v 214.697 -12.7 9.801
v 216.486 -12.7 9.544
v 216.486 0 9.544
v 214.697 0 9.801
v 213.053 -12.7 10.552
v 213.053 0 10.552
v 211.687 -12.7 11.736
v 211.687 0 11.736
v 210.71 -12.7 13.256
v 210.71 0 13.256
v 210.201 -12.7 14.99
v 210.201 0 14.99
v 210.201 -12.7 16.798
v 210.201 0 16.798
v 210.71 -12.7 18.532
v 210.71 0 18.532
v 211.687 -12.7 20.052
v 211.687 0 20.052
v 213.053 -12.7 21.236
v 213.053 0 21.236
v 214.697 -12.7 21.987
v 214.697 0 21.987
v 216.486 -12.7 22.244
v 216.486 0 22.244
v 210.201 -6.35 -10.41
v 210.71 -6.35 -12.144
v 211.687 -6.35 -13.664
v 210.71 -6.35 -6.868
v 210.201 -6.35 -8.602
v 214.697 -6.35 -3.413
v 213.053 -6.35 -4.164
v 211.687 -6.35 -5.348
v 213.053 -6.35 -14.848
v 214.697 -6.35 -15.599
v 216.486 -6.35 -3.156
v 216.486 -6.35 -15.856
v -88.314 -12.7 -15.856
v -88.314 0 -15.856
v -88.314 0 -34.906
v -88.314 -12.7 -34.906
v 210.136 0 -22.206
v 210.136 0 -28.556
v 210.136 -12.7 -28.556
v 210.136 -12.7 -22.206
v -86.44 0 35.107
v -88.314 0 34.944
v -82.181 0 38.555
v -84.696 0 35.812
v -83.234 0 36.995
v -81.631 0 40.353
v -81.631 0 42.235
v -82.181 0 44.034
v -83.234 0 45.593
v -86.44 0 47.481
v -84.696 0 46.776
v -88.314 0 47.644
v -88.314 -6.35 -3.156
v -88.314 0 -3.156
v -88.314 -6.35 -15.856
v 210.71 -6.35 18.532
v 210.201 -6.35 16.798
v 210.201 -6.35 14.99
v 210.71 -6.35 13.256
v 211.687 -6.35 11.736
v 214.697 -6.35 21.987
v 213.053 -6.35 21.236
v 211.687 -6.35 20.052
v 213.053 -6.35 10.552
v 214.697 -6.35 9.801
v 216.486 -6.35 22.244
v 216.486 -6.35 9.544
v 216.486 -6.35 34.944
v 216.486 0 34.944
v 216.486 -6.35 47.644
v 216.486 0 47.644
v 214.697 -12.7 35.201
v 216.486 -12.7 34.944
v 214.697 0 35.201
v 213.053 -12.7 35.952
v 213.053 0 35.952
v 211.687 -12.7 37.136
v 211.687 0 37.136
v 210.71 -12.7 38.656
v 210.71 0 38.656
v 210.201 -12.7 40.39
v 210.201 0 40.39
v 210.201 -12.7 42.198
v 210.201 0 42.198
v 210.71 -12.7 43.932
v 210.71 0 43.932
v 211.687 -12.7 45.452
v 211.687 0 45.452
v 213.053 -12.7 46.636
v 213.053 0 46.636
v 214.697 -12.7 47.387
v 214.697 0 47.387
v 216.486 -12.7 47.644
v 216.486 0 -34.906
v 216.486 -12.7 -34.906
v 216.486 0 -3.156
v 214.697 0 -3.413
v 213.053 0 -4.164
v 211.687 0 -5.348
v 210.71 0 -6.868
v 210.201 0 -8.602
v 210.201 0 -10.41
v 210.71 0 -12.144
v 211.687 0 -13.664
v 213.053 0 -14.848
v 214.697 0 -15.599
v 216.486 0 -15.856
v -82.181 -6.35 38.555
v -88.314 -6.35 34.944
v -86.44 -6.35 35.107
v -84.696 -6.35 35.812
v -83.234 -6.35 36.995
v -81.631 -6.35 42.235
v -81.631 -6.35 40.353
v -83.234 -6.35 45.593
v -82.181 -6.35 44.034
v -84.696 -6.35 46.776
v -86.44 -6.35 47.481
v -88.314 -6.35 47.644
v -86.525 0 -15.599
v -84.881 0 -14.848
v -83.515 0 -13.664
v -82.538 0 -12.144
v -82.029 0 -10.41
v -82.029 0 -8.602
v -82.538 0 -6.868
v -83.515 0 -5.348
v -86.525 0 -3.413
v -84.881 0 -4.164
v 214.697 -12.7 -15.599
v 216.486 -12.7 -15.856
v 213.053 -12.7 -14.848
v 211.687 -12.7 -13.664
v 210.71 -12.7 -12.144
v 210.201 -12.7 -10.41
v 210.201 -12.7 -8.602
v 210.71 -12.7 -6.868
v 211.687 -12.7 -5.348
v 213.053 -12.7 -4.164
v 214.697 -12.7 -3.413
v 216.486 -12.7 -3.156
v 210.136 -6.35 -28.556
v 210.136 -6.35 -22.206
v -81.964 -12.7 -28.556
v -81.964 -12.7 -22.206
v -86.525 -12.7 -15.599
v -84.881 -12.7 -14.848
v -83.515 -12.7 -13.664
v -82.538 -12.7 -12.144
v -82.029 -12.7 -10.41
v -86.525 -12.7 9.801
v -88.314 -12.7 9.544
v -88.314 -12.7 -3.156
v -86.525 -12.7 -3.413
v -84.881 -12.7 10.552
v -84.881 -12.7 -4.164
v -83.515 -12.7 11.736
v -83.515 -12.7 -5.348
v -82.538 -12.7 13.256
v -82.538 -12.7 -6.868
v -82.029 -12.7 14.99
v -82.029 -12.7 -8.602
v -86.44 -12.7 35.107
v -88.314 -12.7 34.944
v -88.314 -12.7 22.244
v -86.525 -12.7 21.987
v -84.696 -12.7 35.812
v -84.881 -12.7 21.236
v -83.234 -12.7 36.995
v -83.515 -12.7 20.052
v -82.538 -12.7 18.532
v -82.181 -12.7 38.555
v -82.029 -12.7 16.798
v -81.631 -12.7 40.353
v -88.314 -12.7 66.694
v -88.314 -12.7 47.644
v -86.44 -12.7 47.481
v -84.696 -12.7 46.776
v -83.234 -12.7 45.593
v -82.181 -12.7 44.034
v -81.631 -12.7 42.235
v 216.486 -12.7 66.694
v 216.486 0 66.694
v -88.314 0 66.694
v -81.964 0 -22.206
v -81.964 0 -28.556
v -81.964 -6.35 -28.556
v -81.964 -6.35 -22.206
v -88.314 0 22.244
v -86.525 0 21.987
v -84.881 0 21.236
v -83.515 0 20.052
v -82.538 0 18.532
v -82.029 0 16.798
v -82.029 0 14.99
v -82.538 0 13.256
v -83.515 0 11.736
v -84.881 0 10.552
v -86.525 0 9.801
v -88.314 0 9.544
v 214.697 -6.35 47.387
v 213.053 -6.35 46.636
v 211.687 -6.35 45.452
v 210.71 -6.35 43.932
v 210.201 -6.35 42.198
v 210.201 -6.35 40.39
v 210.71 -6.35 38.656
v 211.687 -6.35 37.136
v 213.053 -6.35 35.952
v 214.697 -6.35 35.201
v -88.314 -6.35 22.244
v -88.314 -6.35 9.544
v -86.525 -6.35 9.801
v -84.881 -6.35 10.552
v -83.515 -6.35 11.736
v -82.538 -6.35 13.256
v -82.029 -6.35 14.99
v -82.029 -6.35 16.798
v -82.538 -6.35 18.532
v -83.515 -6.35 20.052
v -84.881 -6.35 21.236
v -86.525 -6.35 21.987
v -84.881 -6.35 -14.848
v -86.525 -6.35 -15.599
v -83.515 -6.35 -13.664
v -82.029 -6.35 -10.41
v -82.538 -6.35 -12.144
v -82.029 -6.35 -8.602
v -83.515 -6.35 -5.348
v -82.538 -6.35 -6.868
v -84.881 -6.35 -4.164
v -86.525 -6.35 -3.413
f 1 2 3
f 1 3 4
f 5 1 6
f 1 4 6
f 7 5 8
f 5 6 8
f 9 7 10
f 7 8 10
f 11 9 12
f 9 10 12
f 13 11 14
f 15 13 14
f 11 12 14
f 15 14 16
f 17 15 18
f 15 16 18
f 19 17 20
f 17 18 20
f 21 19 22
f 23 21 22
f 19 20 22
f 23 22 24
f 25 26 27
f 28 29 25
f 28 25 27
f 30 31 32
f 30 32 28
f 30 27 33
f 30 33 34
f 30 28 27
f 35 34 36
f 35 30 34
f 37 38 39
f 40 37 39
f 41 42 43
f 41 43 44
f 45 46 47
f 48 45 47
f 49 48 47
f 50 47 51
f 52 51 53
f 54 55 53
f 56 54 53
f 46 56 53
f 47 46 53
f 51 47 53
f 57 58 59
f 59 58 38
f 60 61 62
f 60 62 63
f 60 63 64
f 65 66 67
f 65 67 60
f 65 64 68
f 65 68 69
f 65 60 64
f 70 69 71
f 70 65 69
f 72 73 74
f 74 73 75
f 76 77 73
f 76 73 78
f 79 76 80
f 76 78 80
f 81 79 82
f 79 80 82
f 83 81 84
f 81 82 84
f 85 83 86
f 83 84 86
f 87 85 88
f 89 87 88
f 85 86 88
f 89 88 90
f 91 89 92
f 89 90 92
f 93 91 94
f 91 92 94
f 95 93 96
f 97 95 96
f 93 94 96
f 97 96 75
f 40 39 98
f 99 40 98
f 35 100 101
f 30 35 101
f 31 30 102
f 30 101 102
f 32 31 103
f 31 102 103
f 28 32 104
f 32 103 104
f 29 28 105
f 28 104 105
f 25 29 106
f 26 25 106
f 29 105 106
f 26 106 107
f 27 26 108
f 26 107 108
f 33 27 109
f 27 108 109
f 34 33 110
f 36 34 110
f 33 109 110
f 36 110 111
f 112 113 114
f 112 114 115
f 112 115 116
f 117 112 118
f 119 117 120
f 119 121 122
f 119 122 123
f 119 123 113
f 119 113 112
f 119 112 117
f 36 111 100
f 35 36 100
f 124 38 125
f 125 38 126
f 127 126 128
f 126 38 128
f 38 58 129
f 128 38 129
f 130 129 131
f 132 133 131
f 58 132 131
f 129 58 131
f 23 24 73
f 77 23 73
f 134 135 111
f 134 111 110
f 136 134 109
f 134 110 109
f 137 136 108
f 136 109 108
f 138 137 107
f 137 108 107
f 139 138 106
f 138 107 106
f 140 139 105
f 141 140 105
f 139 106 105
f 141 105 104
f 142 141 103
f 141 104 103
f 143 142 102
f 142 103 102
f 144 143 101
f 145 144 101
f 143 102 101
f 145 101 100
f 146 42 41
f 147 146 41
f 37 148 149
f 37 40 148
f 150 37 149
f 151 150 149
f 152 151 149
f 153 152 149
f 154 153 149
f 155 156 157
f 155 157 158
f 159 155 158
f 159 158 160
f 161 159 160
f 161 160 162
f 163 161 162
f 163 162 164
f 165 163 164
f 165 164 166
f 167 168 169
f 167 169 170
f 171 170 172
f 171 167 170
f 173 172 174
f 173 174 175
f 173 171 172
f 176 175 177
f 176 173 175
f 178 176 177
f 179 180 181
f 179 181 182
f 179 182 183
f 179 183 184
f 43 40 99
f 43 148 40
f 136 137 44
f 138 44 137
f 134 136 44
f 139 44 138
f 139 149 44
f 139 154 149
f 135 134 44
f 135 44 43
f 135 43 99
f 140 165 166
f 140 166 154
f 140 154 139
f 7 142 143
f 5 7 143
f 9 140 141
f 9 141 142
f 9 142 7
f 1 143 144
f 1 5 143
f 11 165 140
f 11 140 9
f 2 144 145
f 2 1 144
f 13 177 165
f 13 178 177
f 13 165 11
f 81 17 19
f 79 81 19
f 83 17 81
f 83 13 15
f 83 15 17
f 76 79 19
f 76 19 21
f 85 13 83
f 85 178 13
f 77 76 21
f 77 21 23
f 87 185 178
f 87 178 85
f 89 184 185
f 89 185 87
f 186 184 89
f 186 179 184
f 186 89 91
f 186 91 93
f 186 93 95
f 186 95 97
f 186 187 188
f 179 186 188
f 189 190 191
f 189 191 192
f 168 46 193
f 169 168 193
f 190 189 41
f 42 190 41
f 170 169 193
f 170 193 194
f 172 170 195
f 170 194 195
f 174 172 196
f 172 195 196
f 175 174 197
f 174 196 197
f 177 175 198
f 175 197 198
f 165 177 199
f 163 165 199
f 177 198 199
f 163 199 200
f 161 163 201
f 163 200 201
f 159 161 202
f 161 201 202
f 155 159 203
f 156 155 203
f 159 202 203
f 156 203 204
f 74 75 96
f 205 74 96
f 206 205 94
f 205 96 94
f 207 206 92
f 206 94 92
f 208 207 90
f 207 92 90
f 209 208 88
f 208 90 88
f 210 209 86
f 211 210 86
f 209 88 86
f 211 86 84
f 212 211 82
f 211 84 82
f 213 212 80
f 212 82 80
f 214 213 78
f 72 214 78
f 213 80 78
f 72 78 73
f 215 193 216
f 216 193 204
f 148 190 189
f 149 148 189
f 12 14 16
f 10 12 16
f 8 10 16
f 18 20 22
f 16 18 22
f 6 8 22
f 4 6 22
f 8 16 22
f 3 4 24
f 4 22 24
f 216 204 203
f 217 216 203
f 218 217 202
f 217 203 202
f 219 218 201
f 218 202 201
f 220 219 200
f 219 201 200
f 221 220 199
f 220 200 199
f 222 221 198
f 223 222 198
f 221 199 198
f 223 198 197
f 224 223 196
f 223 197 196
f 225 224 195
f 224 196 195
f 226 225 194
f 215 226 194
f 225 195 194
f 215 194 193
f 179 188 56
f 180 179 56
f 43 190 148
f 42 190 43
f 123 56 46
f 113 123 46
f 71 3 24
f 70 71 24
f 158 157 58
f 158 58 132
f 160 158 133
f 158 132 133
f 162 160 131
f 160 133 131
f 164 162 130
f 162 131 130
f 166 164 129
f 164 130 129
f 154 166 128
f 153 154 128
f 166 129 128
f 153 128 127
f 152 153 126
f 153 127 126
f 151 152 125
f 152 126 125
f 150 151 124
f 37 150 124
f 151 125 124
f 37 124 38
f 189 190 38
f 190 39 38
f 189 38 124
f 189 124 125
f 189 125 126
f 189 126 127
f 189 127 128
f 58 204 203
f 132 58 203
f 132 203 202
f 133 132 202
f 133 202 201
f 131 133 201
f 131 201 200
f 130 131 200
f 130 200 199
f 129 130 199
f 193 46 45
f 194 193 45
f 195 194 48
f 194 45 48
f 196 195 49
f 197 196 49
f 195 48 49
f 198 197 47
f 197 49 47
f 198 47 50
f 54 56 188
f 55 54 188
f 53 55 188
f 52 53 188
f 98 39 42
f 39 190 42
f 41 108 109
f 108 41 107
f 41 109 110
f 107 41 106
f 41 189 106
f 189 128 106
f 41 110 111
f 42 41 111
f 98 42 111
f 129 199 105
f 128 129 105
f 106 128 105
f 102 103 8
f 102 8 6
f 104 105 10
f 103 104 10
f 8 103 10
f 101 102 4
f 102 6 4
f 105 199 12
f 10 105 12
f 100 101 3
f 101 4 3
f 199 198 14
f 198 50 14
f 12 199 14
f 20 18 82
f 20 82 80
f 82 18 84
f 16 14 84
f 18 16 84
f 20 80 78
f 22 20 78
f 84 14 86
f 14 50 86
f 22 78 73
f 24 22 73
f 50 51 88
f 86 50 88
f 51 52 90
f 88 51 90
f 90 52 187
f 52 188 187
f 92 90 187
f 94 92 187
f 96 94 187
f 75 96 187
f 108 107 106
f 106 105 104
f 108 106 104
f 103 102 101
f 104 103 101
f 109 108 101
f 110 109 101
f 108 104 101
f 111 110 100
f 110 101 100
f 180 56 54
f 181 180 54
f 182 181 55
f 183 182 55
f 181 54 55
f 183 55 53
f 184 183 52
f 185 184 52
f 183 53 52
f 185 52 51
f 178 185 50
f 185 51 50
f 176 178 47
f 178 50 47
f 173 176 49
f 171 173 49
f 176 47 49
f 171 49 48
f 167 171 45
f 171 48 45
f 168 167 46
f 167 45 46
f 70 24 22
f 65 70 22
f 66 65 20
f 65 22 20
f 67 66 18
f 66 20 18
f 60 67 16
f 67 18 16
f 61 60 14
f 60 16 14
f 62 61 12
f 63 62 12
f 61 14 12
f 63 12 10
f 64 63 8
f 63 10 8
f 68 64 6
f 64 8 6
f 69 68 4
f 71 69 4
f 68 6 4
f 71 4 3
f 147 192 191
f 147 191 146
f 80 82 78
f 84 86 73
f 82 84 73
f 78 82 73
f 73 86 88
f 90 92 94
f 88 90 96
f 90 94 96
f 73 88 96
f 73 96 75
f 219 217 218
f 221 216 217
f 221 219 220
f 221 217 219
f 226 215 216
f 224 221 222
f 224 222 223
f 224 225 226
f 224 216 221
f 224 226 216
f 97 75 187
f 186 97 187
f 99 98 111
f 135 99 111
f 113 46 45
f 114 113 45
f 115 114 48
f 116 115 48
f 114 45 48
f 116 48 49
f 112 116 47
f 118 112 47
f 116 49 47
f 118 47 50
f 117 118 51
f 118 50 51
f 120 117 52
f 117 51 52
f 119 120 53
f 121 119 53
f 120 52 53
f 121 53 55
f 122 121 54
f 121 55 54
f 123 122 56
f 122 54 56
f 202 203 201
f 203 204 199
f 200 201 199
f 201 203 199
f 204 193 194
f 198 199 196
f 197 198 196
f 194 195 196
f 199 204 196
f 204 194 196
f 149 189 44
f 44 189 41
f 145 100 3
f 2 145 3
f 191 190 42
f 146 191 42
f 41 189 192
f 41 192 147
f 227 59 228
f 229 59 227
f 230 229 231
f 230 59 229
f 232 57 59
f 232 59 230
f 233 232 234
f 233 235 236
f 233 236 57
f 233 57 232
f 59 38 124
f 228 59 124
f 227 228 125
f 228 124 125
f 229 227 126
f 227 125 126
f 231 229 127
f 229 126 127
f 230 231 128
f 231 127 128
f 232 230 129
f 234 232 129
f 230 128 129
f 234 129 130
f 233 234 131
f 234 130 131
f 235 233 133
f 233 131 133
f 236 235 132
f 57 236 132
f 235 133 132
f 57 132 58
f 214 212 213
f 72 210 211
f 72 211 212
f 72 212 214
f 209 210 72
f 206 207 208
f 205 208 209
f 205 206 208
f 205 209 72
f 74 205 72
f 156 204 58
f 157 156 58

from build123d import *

# Parameters (mm, degrees)
F0_W     = 292.1
F0_H     = 6.35
F1_DEPTH = 6.35
F2_DEPTH = 6.35
F3_DEPTH = 12.7


with BuildPart() as f1:
    # F0 (on Front) → F1 (new body)
    with BuildSketch(Plane.XZ):
        with Locations((64.085933, -25.380944)):
            Rectangle(F0_W, F0_H)
    extrude(amount=F1_DEPTH)


with BuildPart() as f2:
    # F0 (on Front) → F2 (new body)
    with BuildSketch(Plane.XZ):
        with BuildLine():
            ThreePointArc((-88.314067, -15.855944), (-81.964067, -9.505944), (-88.314067, -3.155944))
            Line((-88.314067, -3.155944), (-88.314067, -15.855944))
        make_face()
        with BuildLine():
            ThreePointArc((-88.314067, 9.544056), (-81.964067, 15.894056), (-88.314067, 22.244056))
            Line((-88.314067, 22.244056), (-88.314067, 9.544056))
        make_face()
        with BuildLine():
            ThreePointArc((-88.314067, 34.944056), (-81.561473, 41.294056), (-88.314067, 47.644056))
            Line((-88.314067, 47.644056), (-88.314067, 34.944056))
        make_face()
        with BuildLine():
            Line((216.485933, 34.944056), (216.485933, 47.644056))
            ThreePointArc((216.485933, 47.644056), (210.135933, 41.294056), (216.485933, 34.944056))
        make_face()
        with BuildLine():
            Line((216.485933, 9.544056), (216.485933, 22.244056))
            ThreePointArc((216.485933, 22.244056), (210.135933, 15.894056), (216.485933, 9.544056))
        make_face()
        with BuildLine():
            Line((216.485933, -15.855944), (216.485933, -3.155944))
            ThreePointArc((216.485933, -3.155944), (210.135933, -9.505944), (216.485933, -15.855944))
        make_face()
    extrude(amount=F2_DEPTH)


with BuildPart() as f3:
    # F0 (on Front) → F3 (new body)
    with BuildSketch(Plane.XZ):
        with BuildLine():
            Line((216.485933, 66.694056), (-88.314067, 66.694056))
            Line((-88.314067, 66.694056), (-88.314067, 47.644056))
            ThreePointArc((-88.314067, 47.644056), (-81.561473, 41.294056), (-88.314067, 34.944056))
            Line((-88.314067, 34.944056), (-88.314067, 22.244056))
            ThreePointArc((-88.314067, 22.244056), (-81.964067, 15.894056), (-88.314067, 9.544056))
            Line((-88.314067, 9.544056), (-88.314067, -3.155944))
            ThreePointArc((-88.314067, -3.155944), (-81.964067, -9.505944), (-88.314067, -15.855944))
            Line((-88.314067, -15.855944), (-88.314067, -34.905944))
            Line((-88.314067, -34.905944), (216.485933, -34.905944))
            Line((216.485933, -34.905944), (216.485933, -15.855944))
            ThreePointArc((216.485933, -15.855944), (210.135933, -9.505944), (216.485933, -3.155944))
            Line((216.485933, -3.155944), (216.485933, 9.544056))
            ThreePointArc((216.485933, 9.544056), (210.135933, 15.894056), (216.485933, 22.244056))
            Line((216.485933, 22.244056), (216.485933, 34.944056))
            ThreePointArc((216.485933, 34.944056), (210.135933, 41.294056), (216.485933, 47.644056))
            Line((216.485933, 47.644056), (216.485933, 66.694056))
        make_face()
        with Locations((64.085933, -25.380944)):
            Rectangle(F0_W, F0_H, mode=Mode.SUBTRACT)
    extrude(amount=F3_DEPTH)


solid = Compound([f1.part, f2.part, f3.part])
